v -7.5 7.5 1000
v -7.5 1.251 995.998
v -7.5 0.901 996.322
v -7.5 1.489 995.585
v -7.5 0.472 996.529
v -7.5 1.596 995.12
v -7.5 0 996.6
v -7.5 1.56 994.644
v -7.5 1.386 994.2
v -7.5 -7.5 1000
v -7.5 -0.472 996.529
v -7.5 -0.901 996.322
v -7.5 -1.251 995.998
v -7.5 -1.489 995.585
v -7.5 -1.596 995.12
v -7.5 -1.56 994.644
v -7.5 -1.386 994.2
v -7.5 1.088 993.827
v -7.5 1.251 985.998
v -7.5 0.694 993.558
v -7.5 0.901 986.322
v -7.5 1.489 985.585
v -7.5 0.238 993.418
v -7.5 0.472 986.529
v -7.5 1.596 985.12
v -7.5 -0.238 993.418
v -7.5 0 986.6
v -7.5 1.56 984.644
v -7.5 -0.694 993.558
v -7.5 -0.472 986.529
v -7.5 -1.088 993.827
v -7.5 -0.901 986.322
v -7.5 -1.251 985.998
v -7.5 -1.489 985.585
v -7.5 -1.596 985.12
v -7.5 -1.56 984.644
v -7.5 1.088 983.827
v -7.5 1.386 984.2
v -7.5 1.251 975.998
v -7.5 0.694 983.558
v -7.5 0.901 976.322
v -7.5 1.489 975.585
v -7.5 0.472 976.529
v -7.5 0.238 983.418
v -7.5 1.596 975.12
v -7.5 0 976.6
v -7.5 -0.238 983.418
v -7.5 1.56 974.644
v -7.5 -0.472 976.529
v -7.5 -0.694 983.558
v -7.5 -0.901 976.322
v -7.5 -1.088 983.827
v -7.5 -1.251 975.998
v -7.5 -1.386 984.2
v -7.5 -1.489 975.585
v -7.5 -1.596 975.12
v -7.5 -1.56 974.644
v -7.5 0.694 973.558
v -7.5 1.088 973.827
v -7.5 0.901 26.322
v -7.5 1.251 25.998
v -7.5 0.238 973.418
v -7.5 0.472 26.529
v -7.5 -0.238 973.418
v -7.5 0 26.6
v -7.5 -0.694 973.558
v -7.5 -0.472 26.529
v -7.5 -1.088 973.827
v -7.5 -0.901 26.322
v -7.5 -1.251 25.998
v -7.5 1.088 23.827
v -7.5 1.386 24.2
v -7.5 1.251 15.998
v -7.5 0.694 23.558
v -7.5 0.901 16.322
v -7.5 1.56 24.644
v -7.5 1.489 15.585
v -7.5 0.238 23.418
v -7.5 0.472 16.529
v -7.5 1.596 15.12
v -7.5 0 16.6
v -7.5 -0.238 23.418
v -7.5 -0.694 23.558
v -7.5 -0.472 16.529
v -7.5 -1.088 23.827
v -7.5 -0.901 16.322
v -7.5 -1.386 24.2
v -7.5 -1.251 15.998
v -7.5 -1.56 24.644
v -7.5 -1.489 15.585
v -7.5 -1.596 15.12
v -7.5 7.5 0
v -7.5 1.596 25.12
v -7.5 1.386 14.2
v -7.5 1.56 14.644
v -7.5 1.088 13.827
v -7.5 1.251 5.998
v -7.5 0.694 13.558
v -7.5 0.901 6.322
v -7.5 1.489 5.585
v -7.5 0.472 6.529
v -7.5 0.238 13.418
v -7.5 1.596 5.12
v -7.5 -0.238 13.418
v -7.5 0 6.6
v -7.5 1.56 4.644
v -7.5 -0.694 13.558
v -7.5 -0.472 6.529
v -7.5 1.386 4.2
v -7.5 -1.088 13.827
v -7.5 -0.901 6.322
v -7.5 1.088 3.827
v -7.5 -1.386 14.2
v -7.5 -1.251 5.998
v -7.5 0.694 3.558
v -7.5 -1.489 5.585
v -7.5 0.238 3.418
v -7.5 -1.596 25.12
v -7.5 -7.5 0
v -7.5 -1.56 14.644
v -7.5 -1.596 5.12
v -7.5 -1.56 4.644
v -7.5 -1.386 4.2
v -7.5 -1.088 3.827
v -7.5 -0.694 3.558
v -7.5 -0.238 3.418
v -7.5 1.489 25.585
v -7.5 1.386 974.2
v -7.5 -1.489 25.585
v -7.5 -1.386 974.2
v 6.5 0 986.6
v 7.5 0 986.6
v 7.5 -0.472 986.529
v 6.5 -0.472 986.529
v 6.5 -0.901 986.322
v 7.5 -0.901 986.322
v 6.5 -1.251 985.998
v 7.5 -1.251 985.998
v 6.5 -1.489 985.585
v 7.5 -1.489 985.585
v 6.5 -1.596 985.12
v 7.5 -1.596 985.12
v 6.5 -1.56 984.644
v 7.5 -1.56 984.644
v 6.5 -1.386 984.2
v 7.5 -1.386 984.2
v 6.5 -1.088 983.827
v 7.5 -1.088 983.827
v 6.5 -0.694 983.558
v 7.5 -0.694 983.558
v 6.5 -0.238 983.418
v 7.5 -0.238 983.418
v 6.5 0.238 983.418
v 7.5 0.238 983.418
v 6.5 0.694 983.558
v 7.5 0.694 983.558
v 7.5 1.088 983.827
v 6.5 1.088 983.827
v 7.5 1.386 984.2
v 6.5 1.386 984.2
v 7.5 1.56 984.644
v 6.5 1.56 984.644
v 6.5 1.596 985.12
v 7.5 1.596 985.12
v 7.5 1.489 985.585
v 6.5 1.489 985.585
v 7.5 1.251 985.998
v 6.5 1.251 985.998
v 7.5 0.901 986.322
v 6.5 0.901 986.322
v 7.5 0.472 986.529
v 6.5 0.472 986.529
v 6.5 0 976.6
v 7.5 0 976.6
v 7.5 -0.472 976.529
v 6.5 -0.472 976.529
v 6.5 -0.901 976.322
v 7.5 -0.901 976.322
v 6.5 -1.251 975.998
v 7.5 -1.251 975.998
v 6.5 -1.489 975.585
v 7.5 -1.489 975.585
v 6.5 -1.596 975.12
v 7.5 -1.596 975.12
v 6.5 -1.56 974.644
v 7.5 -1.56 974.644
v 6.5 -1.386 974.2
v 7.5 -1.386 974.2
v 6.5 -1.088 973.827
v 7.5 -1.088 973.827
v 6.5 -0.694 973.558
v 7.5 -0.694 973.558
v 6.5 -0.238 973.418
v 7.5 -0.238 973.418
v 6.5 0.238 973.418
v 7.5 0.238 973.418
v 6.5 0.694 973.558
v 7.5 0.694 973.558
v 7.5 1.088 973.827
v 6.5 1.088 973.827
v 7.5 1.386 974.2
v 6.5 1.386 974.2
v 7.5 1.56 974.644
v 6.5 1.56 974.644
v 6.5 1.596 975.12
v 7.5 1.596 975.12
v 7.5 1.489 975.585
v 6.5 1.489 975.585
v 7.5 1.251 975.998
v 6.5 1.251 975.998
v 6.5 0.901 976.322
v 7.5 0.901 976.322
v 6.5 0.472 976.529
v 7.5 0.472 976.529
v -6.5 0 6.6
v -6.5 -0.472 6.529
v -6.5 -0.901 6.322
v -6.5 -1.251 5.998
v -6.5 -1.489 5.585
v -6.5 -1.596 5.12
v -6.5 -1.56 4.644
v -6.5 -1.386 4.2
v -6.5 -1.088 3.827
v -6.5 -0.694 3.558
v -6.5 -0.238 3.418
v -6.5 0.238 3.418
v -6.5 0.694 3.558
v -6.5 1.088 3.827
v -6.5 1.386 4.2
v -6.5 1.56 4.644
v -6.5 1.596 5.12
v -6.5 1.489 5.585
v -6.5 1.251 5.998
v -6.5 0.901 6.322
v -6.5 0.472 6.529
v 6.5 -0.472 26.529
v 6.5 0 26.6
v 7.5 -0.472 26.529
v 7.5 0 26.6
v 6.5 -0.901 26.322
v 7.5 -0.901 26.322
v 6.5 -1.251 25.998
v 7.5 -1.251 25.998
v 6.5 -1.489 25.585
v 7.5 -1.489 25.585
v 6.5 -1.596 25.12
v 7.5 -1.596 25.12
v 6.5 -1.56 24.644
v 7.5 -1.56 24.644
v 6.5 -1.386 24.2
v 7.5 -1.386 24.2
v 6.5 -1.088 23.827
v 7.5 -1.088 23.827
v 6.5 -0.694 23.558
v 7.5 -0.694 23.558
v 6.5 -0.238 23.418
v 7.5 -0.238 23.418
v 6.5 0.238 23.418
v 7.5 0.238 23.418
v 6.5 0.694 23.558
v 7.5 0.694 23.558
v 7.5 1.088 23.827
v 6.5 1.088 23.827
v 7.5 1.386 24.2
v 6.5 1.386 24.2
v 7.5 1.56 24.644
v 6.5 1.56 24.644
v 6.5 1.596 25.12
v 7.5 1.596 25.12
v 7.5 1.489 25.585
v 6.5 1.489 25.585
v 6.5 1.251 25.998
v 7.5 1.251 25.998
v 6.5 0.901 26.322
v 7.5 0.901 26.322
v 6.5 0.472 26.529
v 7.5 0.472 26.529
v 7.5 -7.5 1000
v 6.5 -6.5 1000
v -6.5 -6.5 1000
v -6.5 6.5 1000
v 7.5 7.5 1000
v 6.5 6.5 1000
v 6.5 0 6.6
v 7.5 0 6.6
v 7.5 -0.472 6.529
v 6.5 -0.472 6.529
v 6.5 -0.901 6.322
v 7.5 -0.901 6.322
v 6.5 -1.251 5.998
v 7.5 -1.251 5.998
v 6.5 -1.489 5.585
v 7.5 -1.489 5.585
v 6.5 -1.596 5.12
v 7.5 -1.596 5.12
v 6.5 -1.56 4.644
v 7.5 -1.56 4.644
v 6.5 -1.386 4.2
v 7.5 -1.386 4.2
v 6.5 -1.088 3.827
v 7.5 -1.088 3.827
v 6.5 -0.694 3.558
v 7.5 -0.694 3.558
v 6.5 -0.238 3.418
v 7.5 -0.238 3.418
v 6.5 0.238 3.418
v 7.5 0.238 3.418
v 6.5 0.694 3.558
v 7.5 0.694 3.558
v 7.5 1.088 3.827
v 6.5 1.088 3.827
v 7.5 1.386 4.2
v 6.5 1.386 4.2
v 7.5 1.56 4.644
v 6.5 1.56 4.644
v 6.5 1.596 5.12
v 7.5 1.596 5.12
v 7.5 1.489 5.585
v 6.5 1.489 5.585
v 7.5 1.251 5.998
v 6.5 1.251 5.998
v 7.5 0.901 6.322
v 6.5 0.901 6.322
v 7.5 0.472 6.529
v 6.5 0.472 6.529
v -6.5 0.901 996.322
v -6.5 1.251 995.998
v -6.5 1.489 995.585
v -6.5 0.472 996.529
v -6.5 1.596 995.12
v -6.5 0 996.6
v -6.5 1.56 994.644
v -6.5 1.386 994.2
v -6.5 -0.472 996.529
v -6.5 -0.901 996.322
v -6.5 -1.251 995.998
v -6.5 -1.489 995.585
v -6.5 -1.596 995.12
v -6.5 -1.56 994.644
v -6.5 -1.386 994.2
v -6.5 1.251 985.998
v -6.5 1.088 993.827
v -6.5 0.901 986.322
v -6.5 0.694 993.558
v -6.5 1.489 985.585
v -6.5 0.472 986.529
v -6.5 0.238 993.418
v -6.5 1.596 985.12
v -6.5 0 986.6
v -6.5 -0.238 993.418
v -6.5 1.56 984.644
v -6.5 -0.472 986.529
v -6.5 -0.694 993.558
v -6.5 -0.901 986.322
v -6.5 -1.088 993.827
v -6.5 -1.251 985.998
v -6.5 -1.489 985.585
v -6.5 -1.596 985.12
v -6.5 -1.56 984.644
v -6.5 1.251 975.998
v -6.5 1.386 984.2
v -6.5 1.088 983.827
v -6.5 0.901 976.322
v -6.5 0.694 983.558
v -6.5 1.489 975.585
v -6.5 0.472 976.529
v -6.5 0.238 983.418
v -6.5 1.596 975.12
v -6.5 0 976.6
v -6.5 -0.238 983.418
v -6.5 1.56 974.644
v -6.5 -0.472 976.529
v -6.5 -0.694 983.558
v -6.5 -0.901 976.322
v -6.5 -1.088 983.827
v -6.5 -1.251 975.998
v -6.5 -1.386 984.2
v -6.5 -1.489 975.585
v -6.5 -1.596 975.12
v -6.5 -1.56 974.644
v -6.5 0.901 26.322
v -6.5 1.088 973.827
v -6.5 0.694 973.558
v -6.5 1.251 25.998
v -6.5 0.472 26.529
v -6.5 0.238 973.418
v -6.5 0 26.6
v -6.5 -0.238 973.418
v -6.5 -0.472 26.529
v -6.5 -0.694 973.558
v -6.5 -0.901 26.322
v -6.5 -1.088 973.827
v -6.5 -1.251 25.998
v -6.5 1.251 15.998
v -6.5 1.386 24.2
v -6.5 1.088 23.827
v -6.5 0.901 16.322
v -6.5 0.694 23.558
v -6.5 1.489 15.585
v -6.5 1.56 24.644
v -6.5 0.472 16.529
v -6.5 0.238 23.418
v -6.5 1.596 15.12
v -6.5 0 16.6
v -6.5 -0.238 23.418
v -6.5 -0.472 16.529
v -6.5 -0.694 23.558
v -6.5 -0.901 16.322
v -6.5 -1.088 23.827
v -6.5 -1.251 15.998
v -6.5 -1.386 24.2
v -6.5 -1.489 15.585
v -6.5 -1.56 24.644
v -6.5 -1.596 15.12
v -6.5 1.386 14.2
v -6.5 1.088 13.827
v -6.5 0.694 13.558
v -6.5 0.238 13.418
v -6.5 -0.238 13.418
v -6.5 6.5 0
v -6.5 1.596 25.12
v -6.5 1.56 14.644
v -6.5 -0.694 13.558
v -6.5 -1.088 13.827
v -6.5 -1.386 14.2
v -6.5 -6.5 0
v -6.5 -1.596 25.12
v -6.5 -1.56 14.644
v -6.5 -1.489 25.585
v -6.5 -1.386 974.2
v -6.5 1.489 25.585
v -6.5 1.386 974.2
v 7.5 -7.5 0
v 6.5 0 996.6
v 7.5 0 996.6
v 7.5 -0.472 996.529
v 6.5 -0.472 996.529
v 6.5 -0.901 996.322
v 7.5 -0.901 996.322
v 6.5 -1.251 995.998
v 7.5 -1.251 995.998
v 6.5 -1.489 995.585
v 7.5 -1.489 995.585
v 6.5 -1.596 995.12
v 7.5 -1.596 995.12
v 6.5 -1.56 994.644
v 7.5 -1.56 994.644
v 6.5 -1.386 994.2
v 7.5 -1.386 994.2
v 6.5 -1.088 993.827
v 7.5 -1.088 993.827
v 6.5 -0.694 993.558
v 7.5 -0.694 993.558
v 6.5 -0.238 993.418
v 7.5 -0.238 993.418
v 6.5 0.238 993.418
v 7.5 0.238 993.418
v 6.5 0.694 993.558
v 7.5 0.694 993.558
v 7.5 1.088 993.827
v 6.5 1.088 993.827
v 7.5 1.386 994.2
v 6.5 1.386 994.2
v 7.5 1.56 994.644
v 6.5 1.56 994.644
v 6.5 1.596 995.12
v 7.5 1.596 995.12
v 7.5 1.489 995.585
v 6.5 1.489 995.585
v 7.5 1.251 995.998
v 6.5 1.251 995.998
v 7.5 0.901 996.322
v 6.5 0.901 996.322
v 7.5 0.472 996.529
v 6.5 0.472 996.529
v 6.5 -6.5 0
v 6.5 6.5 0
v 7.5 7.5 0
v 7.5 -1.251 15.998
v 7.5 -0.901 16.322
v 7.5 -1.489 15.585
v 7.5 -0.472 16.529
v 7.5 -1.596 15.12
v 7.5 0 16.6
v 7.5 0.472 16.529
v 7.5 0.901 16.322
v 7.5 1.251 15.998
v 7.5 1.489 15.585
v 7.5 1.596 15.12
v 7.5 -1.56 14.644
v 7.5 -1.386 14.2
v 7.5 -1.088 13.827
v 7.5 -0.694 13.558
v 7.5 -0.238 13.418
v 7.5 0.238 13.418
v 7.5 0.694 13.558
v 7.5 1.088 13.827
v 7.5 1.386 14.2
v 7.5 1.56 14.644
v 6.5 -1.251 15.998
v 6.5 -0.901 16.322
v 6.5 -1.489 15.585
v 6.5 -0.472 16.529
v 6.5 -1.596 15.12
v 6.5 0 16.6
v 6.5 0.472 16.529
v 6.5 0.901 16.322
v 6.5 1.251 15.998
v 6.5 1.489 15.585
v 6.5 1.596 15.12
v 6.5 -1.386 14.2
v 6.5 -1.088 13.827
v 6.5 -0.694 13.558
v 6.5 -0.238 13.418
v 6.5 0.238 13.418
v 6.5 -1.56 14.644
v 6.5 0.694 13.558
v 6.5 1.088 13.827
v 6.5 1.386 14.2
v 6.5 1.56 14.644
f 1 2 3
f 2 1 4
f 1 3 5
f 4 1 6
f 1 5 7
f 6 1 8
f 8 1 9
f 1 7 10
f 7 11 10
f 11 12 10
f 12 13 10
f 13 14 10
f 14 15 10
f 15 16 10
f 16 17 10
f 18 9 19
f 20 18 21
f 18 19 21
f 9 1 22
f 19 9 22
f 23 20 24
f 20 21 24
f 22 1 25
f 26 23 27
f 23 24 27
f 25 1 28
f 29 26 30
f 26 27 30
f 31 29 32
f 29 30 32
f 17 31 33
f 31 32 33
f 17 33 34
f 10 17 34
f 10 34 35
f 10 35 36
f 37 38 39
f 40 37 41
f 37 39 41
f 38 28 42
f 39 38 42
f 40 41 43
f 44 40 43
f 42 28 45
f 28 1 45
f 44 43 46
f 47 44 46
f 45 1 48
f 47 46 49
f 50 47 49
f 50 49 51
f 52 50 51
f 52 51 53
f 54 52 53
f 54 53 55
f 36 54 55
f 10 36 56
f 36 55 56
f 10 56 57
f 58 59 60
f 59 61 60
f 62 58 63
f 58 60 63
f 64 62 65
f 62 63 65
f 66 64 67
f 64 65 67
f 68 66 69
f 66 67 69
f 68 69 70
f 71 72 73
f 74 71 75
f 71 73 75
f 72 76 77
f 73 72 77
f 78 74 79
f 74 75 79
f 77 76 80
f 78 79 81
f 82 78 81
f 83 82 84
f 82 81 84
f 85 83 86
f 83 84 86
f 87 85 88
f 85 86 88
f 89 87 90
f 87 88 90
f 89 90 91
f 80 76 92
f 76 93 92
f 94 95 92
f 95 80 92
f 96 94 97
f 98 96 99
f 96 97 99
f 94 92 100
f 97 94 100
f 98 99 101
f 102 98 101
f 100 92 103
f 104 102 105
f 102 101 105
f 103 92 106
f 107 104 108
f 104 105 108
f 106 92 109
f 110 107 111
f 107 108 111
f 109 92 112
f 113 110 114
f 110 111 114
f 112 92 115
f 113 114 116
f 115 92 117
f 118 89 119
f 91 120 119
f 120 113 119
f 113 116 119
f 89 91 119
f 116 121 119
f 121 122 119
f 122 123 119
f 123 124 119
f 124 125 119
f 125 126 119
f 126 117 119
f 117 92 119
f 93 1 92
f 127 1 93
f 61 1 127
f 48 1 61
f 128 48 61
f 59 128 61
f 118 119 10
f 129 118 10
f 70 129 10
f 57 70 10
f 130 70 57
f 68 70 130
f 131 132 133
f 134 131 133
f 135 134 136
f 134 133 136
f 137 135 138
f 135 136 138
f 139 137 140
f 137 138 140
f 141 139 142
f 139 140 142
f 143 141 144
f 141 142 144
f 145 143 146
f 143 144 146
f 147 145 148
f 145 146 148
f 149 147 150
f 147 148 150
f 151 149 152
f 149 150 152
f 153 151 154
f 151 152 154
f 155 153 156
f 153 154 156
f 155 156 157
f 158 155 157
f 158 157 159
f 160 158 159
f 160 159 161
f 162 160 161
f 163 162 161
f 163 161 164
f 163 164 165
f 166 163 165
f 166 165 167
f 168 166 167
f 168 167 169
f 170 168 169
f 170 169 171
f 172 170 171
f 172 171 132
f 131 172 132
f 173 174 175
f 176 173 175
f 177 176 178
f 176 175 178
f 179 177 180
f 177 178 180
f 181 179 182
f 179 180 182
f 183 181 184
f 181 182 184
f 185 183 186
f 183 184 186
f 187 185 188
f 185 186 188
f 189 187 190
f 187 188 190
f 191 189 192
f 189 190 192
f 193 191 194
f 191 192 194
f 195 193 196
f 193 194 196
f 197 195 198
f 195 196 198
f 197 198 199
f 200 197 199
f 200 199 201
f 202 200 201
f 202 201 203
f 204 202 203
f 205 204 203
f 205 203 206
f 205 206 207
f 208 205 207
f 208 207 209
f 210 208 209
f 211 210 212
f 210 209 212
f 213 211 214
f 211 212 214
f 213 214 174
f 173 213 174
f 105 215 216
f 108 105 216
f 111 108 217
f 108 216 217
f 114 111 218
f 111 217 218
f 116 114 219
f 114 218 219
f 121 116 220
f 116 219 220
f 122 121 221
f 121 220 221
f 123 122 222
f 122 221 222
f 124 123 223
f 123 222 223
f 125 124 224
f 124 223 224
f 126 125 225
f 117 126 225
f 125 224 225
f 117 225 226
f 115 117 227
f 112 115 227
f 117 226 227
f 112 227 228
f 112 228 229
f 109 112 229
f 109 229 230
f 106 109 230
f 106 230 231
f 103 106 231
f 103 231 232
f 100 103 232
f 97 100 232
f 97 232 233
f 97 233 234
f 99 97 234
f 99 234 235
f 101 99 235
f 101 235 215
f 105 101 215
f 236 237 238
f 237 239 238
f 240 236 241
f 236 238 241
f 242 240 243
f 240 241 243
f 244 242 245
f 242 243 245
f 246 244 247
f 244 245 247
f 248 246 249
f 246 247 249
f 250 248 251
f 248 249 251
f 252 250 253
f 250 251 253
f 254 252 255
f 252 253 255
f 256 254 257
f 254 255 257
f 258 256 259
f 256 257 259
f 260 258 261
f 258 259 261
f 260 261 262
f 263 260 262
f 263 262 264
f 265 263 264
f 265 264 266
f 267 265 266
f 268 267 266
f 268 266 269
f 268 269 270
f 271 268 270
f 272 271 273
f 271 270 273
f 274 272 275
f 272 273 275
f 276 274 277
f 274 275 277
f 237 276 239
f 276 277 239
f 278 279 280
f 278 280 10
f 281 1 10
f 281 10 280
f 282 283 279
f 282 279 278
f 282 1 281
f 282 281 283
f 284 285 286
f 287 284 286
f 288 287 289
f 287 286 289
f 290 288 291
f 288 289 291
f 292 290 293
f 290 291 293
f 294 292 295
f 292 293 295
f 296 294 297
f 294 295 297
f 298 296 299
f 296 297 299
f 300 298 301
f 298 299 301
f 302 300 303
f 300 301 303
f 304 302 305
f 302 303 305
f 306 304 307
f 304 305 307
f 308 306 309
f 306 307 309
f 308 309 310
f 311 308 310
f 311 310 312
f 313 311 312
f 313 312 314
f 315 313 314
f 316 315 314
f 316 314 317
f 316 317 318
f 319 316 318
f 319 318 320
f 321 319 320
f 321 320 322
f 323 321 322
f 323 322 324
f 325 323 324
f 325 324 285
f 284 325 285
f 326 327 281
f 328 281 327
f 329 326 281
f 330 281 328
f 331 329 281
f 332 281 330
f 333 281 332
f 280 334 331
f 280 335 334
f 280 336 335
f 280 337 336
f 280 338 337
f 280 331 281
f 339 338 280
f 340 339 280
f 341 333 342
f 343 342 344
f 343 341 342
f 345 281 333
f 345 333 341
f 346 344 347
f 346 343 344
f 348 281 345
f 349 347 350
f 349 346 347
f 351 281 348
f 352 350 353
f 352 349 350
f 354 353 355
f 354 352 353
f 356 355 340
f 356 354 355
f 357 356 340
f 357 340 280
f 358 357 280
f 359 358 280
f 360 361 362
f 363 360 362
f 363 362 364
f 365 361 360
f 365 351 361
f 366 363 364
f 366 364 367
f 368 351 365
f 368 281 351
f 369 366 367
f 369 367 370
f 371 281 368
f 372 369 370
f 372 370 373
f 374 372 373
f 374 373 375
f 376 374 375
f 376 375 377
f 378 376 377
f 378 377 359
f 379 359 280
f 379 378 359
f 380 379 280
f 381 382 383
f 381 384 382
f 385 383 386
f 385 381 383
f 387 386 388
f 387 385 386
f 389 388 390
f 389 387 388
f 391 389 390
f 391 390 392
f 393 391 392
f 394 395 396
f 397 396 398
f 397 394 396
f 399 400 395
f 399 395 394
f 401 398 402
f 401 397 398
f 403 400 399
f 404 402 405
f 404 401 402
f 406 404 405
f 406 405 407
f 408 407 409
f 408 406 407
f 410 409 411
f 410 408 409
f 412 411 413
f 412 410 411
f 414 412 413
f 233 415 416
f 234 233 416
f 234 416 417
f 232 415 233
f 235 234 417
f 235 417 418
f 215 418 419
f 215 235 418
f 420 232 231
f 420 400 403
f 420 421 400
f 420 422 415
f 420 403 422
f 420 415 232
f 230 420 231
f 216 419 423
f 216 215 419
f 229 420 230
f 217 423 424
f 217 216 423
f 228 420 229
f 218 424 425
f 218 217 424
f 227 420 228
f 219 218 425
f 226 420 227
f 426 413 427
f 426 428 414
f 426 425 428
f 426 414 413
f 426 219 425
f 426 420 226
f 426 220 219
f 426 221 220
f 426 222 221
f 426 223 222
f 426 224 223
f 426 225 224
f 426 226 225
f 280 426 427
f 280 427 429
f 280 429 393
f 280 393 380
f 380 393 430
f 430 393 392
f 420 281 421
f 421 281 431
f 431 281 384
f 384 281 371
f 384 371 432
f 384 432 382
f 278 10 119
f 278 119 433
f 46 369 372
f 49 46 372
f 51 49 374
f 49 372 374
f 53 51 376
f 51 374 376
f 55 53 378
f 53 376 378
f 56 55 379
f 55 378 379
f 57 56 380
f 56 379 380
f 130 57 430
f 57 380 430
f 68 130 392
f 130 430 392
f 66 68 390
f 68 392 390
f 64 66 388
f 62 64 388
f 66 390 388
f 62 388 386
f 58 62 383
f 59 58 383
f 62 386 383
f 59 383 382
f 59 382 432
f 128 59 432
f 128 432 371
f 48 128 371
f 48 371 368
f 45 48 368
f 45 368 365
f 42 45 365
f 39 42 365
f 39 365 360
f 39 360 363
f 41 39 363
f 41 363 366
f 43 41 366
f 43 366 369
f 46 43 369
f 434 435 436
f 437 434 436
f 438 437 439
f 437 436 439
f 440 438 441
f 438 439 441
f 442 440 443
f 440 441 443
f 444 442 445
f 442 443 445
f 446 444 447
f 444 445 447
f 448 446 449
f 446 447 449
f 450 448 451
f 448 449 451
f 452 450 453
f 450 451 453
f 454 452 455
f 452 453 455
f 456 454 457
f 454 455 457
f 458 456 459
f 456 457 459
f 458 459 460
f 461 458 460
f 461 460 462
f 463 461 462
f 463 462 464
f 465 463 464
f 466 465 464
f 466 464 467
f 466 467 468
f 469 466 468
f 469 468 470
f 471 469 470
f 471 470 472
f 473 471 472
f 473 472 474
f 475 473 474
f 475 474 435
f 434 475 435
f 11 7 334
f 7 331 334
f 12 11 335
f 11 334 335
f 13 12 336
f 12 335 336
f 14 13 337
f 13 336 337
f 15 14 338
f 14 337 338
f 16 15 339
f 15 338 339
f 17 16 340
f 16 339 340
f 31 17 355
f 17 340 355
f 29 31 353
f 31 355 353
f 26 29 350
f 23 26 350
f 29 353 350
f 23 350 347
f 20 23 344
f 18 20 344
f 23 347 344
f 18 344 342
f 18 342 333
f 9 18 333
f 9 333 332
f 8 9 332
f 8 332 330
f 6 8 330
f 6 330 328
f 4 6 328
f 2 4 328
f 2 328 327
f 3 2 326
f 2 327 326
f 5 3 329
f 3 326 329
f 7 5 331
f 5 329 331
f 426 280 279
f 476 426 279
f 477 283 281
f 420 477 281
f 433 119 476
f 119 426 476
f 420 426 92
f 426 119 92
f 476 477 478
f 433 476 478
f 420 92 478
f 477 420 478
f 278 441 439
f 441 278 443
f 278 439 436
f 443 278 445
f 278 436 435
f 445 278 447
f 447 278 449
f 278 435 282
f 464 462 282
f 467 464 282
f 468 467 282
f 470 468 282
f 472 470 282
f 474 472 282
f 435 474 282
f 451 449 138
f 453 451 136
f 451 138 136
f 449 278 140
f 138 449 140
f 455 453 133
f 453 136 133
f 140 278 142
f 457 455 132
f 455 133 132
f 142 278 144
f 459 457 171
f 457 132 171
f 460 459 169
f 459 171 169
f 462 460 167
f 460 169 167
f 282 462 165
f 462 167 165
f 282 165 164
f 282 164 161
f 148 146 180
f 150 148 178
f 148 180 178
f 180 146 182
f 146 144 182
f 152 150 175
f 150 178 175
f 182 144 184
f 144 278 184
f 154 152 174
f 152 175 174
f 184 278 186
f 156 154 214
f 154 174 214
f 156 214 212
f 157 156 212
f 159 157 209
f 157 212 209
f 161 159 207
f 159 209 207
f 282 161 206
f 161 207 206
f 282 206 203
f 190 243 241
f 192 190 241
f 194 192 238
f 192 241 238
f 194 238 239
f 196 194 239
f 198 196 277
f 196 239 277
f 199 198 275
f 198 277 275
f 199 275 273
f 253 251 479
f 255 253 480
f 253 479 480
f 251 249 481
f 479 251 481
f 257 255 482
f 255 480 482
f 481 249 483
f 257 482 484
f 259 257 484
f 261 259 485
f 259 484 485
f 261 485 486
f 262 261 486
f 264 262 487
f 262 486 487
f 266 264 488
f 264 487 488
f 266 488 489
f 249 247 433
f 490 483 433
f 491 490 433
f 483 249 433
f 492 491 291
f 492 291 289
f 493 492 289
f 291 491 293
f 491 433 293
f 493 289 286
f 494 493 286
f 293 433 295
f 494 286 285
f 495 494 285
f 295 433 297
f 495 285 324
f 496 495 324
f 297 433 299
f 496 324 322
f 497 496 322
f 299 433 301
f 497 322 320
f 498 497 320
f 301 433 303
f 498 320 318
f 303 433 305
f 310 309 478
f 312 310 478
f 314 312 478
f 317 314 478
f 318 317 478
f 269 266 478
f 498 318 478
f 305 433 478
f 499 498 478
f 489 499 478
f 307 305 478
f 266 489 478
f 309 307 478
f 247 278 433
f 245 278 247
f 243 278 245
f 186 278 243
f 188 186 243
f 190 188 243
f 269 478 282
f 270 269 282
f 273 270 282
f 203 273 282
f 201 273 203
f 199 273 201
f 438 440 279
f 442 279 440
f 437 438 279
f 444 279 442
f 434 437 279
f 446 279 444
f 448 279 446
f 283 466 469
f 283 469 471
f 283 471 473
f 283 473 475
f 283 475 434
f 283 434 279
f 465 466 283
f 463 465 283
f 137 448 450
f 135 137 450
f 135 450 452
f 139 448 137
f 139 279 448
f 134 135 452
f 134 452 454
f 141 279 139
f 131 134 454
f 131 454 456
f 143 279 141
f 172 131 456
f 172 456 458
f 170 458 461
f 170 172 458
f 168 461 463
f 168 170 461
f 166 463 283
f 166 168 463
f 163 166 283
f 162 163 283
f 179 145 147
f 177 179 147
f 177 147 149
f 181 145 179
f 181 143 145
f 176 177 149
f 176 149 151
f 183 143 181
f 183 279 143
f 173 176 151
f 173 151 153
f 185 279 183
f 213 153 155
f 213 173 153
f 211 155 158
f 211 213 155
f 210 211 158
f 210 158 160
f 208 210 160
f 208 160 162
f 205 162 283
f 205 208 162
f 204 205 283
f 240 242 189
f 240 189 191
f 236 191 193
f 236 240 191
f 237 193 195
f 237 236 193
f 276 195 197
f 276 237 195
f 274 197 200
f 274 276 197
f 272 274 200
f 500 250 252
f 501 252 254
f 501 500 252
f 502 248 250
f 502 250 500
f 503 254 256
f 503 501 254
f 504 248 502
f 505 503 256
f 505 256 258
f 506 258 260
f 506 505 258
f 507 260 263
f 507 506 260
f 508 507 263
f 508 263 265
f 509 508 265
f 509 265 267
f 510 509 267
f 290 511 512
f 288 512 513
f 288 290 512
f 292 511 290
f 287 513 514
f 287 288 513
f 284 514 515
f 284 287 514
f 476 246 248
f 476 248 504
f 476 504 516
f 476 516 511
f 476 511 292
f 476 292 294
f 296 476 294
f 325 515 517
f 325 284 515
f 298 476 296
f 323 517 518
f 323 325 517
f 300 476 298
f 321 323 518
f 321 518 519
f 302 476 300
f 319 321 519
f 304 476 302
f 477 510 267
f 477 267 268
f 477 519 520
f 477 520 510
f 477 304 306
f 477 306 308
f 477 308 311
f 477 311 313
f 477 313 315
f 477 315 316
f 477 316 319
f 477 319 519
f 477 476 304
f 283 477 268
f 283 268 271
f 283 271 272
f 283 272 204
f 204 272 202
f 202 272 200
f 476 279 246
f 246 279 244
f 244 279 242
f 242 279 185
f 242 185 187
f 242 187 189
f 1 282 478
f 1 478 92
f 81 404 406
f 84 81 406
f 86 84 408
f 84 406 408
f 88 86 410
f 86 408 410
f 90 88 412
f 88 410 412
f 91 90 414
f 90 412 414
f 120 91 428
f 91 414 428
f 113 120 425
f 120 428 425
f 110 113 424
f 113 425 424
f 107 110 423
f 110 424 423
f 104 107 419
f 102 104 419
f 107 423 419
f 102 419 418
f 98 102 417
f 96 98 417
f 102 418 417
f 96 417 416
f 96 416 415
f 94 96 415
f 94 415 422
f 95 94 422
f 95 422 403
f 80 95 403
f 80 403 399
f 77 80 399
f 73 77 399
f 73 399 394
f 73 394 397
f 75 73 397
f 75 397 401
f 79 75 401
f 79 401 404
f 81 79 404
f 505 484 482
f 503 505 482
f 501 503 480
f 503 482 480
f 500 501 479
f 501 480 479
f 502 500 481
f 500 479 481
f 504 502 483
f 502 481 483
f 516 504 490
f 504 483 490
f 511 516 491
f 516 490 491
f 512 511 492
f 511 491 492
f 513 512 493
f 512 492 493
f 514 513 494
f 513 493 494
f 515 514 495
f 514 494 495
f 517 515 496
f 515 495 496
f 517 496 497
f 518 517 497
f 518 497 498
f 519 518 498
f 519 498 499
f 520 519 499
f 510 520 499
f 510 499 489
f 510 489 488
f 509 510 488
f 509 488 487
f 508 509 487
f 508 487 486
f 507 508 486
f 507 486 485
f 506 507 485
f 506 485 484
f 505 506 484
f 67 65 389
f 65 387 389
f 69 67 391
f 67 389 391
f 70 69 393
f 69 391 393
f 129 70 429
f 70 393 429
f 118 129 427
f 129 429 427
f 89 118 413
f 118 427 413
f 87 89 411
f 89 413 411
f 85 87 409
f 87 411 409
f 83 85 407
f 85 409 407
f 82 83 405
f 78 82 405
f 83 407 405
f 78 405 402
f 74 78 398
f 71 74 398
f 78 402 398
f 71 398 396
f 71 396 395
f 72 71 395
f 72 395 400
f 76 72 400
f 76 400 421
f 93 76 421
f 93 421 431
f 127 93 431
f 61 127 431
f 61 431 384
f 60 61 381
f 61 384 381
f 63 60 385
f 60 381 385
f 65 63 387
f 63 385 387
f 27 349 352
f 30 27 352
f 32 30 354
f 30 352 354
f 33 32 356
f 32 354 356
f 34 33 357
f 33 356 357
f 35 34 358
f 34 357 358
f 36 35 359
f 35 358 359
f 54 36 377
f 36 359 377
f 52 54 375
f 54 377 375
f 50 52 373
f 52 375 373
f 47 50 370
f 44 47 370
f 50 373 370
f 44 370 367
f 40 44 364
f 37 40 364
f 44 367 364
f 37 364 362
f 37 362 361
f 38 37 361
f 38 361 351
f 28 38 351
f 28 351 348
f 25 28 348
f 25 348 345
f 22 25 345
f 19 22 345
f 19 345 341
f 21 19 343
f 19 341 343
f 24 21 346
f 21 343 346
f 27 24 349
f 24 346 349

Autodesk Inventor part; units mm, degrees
ref_plane "YZ Plane" through (0, 0, 0) normal (1, 0, 0) x (0, 1, 0)
ref_plane "XZ Plane" through (0, 0, 0) normal (0, 1, 0) x (-1, 0, 0)
ref_plane "XY Plane" through (0, 0, 0) normal (0, 0, 1) x (1, 0, 0)
sketch "スケッチ1" plane through (0, 0, 0) normal (0, 0, 1) x (1, 0, 0)
  line L0 (7.5, 7.5) -> (-7.5, 7.5)
  line L1 (-7.5, 7.5) -> (-7.5, -7.5)
  line L2 (-7.5, -7.5) -> (7.5, -7.5)
  line L3 (7.5, -7.5) -> (7.5, 7.5)
  line L4 (7.5, 7.5) -> (-7.5, -7.5) construction
  line L5 (-7.5, 7.5) -> (7.5, -7.5) construction
  point P0 (0, 0)
  dimension "d0" = 15
  dimension "d1" = 15
extrude "押し出し1" add sketch "スケッチ1" along normal blind 1000
shell "シェル1" thickness 1 removed faces 2 at (-2.5, 2.5, 0) at (-2.5, 2.5, 1000)
sketch "スケッチ2" plane through (-7.5, -7.5, 0) normal (-1, 0, 0) x (0, 0, 1)
  line L0 (0, 0) -> (0, 15) projected
  line L1 (0, 15) -> (1000, 15) projected
  line L2 (1000, 0) -> (1000, 15) projected
  line L3 (0, 0) -> (1000, 0) projected
  line L4 (1000, 15) -> (1000, 0) projected
  line L5 (0, 15) -> (0, 0) projected
  point P0 (5, 7.5)
  point P1 (15, 7.5)
  point P2 (25, 7.5)
  point P3 (995, 7.5)
  point P4 (985, 7.5)
  point P5 (975, 7.5)
  point P6 (1000, 7.5)
  point P7 (0, 7.5)
  dimension "d5" = 10
  dimension "d6" = 10
  dimension "d9" = 10
  dimension "d10" = 10
  dimension "d18" = 5
  dimension "d19" = 5
hole "穴1" at (-7.5, 0, 5) at (-7.5, 0, 15) at (-7.5, 0, 25) at (-7.5, 0, 995) at (-7.5, 0, 985) at (-7.5, 0, 975) direction (1, 0, 0) diameter 3.2 end through all
equation "\"d6\" = d5"
equation "\"d10\" = d9"
properties part number "□15"
